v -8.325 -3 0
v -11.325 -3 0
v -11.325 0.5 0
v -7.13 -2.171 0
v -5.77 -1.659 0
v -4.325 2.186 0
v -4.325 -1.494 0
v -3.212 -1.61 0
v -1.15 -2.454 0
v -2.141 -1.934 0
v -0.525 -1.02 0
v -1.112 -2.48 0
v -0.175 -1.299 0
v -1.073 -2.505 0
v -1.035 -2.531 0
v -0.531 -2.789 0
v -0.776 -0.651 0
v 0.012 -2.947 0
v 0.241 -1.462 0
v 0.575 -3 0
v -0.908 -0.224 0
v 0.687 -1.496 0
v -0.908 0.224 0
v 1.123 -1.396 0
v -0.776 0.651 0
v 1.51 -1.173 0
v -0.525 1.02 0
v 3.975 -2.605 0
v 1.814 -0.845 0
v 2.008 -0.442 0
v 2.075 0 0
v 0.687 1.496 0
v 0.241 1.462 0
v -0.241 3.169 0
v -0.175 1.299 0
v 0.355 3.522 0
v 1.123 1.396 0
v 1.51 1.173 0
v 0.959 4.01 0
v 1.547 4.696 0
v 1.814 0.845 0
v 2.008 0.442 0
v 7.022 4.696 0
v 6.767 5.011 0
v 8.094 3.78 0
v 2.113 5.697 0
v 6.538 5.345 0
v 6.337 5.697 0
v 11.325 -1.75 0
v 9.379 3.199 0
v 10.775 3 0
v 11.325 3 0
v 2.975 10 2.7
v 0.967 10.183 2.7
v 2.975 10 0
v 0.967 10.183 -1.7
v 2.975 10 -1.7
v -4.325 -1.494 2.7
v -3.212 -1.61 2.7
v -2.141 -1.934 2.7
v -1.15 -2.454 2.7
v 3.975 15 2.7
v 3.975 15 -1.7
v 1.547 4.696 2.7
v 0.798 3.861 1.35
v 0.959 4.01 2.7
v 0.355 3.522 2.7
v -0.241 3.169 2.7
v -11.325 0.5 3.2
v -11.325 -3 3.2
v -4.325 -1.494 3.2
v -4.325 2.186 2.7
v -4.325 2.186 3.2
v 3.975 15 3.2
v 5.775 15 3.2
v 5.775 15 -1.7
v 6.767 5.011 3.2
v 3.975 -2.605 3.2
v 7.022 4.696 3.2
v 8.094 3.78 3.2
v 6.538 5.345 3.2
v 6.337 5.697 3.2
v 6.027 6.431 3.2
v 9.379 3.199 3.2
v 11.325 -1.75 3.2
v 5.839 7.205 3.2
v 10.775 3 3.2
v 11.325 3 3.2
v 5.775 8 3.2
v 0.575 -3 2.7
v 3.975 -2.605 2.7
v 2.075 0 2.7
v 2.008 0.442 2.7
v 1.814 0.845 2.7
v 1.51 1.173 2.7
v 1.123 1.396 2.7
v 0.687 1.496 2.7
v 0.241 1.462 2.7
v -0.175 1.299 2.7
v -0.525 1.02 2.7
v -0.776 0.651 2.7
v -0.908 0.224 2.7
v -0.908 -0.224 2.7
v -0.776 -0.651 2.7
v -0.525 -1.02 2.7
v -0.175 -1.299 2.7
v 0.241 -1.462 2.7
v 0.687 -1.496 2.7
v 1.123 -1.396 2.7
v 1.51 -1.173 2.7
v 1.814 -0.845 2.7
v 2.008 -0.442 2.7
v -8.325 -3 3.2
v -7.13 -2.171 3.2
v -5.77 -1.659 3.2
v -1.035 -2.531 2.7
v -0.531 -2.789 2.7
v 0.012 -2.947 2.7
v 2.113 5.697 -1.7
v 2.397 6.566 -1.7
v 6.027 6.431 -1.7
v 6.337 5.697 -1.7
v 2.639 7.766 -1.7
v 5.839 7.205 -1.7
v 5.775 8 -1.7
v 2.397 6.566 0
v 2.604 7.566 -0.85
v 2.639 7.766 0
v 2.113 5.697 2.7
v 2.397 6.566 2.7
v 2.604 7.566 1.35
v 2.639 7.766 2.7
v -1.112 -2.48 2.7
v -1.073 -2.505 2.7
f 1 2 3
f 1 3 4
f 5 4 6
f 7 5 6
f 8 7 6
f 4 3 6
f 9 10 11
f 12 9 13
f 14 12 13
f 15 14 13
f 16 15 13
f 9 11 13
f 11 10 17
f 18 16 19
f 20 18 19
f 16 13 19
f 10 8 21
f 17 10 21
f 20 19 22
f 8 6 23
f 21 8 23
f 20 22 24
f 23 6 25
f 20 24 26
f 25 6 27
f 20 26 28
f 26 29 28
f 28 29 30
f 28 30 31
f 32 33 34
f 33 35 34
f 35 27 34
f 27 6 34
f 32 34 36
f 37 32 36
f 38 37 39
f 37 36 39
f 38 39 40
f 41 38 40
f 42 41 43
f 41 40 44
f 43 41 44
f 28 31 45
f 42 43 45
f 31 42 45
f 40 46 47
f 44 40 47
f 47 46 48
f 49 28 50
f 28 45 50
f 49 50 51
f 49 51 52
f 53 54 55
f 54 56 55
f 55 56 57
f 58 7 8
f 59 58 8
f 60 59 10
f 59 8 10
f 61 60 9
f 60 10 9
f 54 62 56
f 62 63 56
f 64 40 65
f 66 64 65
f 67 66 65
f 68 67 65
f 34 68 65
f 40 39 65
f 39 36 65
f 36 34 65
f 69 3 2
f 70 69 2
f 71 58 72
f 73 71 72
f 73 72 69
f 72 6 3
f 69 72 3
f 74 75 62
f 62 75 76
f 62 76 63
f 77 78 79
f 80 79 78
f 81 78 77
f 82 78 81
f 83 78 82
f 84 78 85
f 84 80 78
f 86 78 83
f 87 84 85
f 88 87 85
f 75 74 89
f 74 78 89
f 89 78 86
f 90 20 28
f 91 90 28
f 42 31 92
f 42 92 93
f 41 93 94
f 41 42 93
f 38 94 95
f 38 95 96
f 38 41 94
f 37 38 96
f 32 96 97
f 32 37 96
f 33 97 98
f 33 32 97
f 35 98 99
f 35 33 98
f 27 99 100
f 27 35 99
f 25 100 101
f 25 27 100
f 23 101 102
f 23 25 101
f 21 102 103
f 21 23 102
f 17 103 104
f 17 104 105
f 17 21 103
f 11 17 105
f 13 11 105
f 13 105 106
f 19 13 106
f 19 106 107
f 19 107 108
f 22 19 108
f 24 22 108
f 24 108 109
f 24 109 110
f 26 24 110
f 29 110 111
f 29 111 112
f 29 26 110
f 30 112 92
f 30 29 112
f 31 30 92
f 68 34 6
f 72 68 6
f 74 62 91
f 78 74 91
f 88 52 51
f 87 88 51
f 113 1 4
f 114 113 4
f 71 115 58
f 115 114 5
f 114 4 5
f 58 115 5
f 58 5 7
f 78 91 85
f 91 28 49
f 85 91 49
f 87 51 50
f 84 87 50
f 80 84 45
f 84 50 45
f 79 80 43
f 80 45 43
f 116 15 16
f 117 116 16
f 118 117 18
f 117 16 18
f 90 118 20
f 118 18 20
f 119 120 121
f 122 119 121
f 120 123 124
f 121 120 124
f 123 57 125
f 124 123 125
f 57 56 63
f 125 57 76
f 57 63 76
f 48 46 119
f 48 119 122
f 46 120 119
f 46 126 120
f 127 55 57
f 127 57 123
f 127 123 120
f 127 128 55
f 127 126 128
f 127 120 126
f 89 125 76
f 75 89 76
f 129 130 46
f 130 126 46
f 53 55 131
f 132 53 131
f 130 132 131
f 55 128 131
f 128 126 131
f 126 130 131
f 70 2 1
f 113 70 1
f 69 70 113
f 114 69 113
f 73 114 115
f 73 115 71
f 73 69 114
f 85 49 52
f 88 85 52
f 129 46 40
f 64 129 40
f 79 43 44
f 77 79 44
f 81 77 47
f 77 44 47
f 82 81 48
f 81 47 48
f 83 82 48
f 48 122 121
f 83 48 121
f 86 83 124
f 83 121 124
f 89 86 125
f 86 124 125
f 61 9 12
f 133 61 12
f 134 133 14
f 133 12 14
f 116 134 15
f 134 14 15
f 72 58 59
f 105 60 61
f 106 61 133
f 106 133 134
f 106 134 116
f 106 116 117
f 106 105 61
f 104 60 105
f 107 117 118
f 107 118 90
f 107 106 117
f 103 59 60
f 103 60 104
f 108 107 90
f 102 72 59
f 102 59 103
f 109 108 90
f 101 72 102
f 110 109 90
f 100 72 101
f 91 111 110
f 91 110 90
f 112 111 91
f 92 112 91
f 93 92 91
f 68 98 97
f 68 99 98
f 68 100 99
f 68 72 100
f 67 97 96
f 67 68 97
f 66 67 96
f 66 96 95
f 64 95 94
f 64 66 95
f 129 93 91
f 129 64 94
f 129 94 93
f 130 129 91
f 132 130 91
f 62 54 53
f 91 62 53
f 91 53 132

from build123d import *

# Parameters (mm, degrees)
F0_R     = 1.5
F1_DEPTH = 2.7
F2_DEPTH = 3.2
F3_DEPTH = 2.7
F4_DEPTH = 3.2
F5_DEPTH = 1.7
F6_DEPTH = 3.2


with BuildPart() as f1:
    # F0 (on Top) → F1 (new body)
    with BuildSketch(Plane.XY):
        with BuildLine():
            Line((-4.325, 2.1857004834), (-4.325, -1.4937755356))
            ThreePointArc((-4.325, -1.4937755356), (-2.6690400274, -1.7468749135), (-1.1504704305, -2.4541295388))
            ThreePointArc((-1.1504704305, -2.4541295388), (-1.0926241638, -2.4923454544), (-1.0352298419, -2.5312368234))
            ThreePointArc((-1.0352298419, -2.5312368234), (-0.263537277, -2.8804262246), (0.575, -3))
            Line((0.575, -3), (3.975, -2.6046511628))
            Line((3.975, -2.6046511628), (3.975, 4.6964450739))
            Line((3.975, 4.6964450739), (1.5472968315, 4.6964450739))
            add(Edge.make_bspline(
                [(1.5472968315, 4.6964450739), (1.3144459312, 4.3733731641), (0.6967900923, 3.6911224637), (0.1028413655, 3.3605125255), (-0.240789904, 3.1692369025)],
                knots=[0.6540594598, 0.6540594598, 0.6540594598, 0.6540594598, 0.7998547995, 1, 1, 1, 1], degree=3))
            Line((-0.240789904, 3.1692369025), (-4.325, 2.1857004834))
        make_face()
        with Locations((0.575, 0)):
            Circle(F0_R, mode=Mode.SUBTRACT)
    extrude(amount=F1_DEPTH)

    # F0 (on Top) → F2 (join)
    with BuildSketch(Plane.XY):
        with BuildLine():
            Line((-11.325, 0.5), (-11.325, -3))
            Line((-11.325, -3), (-8.325, -3))
            ThreePointArc((-8.325, -3), (-6.4658219239, -1.872914493), (-4.325, -1.4937755356))
            Line((-4.325, -1.4937755356), (-4.325, 2.1857004834))
            Line((-4.325, 2.1857004834), (-11.325, 0.5))
        make_face()
    extrude(amount=F2_DEPTH)

    # F0 (on Top) → F3 (join)
    with BuildSketch(Plane.XY):
        with BuildLine():
            add(Edge.make_bspline(
                [(2.1125420716, 5.6967418641), (2.0793732606, 5.6176202325), (1.9227685724, 5.2694923337), (1.7196807638, 4.9356213286), (1.5472968315, 4.6964450739)],
                knots=[0.5147370924, 0.5147370924, 0.5147370924, 0.5147370924, 0.546124408, 0.6540594598, 0.6540594598, 0.6540594598, 0.6540594598], degree=3))
            Line((1.5472968315, 4.6964450739), (3.975, 4.6964450739))
            Line((3.975, 4.6964450739), (3.975, 5.6967418641))
            Line((3.975, 5.6967418641), (2.1125420716, 5.6967418641))
        make_face()
        with BuildLine():
            add(Edge.make_bspline(
                [(2.975, 10), (2.8586448523, 9.1762784971), (2.6455796583, 7.6679104943), (2.3594416082, 6.2857016012), (2.1125420716, 5.6967418641)],
                knots=[0, 0, 0, 0, 0.2810985188, 0.5147370924, 0.5147370924, 0.5147370924, 0.5147370924], degree=3))
            Line((2.1125420716, 5.6967418641), (3.975, 5.6967418641))
            Line((3.975, 5.6967418641), (3.975, 15))
            Line((3.975, 15), (0.9666787216, 10.1831827385))
            Line((0.9666787216, 10.1831827385), (2.975, 10))
        make_face()
    extrude(amount=F3_DEPTH)

    # F0 (on Top) → F4 (join)
    with BuildSketch(Plane.XY):
        with BuildLine():
            Line((3.975, 15), (3.975, 5.6967418641))
            Line((3.975, 5.6967418641), (6.3370948682, 5.6967418641))
            ThreePointArc((6.3370948682, 5.6967418641), (5.9175559365, 6.8145730008), (5.775, 8))
            Line((5.775, 8), (5.775, 15))
            Line((5.775, 15), (3.975, 15))
        make_face()
        with BuildLine():
            Line((3.975, 5.6967418641), (3.975, 4.6964450739))
            Line((3.975, 4.6964450739), (7.0217980536, 4.6964450739))
            ThreePointArc((7.0217980536, 4.6964450739), (6.6490204546, 5.1757668667), (6.3370948682, 5.6967418641))
            Line((6.3370948682, 5.6967418641), (3.975, 5.6967418641))
        make_face()
        with BuildLine():
            Line((7.0217980536, 4.6964450739), (3.975, 4.6964450739))
            Line((3.975, 4.6964450739), (3.975, -2.6046511628))
            Line((3.975, -2.6046511628), (11.325, -1.75))
            Line((11.325, -1.75), (11.325, 2.9936889187))
            Line((11.325, 2.9936889187), (11.325, 3))
            Line((11.325, 3), (11.3100688905, 3))
            Line((11.3100688905, 3), (10.775, 3))
            ThreePointArc((10.775, 3), (8.7156038058, 3.4438078053), (7.0217980536, 4.6964450739))
        make_face()
    extrude(amount=F4_DEPTH)

    # F0 (on Top) → F5 (join)
    with BuildSketch(Plane.XY):
        with BuildLine():
            Line((3.975, 15), (3.975, 5.6967418641))
            Line((3.975, 5.6967418641), (6.3370948682, 5.6967418641))
            ThreePointArc((6.3370948682, 5.6967418641), (5.9175559365, 6.8145730008), (5.775, 8))
            Line((5.775, 8), (5.775, 15))
            Line((5.775, 15), (3.975, 15))
        make_face()
        with BuildLine():
            add(Edge.make_bspline(
                [(2.975, 10), (2.8586448523, 9.1762784971), (2.6455796583, 7.6679104943), (2.3594416082, 6.2857016012), (2.1125420716, 5.6967418641)],
                knots=[0, 0, 0, 0, 0.2810985188, 0.5147370924, 0.5147370924, 0.5147370924, 0.5147370924], degree=3))
            Line((2.1125420716, 5.6967418641), (3.975, 5.6967418641))
            Line((3.975, 5.6967418641), (3.975, 15))
            Line((3.975, 15), (0.9666787216, 10.1831827385))
            Line((0.9666787216, 10.1831827385), (2.975, 10))
        make_face()
    extrude(amount=-F5_DEPTH)

    # F0 (on Top) → F6 (join)
    with BuildSketch(Plane.XY):
        with BuildLine():
            Line((7.0217980536, 4.6964450739), (3.975, 4.6964450739))
            Line((3.975, 4.6964450739), (3.975, -2.6046511628))
            Line((3.975, -2.6046511628), (11.325, -1.75))
            Line((11.325, -1.75), (11.325, 2.9936889187))
            Line((11.325, 2.9936889187), (11.325, 3))
            Line((11.325, 3), (11.3100688905, 3))
            Line((11.3100688905, 3), (10.775, 3))
            ThreePointArc((10.775, 3), (8.7156038058, 3.4438078053), (7.0217980536, 4.6964450739))
        make_face()
    extrude(amount=F6_DEPTH)


solid = f1.part
